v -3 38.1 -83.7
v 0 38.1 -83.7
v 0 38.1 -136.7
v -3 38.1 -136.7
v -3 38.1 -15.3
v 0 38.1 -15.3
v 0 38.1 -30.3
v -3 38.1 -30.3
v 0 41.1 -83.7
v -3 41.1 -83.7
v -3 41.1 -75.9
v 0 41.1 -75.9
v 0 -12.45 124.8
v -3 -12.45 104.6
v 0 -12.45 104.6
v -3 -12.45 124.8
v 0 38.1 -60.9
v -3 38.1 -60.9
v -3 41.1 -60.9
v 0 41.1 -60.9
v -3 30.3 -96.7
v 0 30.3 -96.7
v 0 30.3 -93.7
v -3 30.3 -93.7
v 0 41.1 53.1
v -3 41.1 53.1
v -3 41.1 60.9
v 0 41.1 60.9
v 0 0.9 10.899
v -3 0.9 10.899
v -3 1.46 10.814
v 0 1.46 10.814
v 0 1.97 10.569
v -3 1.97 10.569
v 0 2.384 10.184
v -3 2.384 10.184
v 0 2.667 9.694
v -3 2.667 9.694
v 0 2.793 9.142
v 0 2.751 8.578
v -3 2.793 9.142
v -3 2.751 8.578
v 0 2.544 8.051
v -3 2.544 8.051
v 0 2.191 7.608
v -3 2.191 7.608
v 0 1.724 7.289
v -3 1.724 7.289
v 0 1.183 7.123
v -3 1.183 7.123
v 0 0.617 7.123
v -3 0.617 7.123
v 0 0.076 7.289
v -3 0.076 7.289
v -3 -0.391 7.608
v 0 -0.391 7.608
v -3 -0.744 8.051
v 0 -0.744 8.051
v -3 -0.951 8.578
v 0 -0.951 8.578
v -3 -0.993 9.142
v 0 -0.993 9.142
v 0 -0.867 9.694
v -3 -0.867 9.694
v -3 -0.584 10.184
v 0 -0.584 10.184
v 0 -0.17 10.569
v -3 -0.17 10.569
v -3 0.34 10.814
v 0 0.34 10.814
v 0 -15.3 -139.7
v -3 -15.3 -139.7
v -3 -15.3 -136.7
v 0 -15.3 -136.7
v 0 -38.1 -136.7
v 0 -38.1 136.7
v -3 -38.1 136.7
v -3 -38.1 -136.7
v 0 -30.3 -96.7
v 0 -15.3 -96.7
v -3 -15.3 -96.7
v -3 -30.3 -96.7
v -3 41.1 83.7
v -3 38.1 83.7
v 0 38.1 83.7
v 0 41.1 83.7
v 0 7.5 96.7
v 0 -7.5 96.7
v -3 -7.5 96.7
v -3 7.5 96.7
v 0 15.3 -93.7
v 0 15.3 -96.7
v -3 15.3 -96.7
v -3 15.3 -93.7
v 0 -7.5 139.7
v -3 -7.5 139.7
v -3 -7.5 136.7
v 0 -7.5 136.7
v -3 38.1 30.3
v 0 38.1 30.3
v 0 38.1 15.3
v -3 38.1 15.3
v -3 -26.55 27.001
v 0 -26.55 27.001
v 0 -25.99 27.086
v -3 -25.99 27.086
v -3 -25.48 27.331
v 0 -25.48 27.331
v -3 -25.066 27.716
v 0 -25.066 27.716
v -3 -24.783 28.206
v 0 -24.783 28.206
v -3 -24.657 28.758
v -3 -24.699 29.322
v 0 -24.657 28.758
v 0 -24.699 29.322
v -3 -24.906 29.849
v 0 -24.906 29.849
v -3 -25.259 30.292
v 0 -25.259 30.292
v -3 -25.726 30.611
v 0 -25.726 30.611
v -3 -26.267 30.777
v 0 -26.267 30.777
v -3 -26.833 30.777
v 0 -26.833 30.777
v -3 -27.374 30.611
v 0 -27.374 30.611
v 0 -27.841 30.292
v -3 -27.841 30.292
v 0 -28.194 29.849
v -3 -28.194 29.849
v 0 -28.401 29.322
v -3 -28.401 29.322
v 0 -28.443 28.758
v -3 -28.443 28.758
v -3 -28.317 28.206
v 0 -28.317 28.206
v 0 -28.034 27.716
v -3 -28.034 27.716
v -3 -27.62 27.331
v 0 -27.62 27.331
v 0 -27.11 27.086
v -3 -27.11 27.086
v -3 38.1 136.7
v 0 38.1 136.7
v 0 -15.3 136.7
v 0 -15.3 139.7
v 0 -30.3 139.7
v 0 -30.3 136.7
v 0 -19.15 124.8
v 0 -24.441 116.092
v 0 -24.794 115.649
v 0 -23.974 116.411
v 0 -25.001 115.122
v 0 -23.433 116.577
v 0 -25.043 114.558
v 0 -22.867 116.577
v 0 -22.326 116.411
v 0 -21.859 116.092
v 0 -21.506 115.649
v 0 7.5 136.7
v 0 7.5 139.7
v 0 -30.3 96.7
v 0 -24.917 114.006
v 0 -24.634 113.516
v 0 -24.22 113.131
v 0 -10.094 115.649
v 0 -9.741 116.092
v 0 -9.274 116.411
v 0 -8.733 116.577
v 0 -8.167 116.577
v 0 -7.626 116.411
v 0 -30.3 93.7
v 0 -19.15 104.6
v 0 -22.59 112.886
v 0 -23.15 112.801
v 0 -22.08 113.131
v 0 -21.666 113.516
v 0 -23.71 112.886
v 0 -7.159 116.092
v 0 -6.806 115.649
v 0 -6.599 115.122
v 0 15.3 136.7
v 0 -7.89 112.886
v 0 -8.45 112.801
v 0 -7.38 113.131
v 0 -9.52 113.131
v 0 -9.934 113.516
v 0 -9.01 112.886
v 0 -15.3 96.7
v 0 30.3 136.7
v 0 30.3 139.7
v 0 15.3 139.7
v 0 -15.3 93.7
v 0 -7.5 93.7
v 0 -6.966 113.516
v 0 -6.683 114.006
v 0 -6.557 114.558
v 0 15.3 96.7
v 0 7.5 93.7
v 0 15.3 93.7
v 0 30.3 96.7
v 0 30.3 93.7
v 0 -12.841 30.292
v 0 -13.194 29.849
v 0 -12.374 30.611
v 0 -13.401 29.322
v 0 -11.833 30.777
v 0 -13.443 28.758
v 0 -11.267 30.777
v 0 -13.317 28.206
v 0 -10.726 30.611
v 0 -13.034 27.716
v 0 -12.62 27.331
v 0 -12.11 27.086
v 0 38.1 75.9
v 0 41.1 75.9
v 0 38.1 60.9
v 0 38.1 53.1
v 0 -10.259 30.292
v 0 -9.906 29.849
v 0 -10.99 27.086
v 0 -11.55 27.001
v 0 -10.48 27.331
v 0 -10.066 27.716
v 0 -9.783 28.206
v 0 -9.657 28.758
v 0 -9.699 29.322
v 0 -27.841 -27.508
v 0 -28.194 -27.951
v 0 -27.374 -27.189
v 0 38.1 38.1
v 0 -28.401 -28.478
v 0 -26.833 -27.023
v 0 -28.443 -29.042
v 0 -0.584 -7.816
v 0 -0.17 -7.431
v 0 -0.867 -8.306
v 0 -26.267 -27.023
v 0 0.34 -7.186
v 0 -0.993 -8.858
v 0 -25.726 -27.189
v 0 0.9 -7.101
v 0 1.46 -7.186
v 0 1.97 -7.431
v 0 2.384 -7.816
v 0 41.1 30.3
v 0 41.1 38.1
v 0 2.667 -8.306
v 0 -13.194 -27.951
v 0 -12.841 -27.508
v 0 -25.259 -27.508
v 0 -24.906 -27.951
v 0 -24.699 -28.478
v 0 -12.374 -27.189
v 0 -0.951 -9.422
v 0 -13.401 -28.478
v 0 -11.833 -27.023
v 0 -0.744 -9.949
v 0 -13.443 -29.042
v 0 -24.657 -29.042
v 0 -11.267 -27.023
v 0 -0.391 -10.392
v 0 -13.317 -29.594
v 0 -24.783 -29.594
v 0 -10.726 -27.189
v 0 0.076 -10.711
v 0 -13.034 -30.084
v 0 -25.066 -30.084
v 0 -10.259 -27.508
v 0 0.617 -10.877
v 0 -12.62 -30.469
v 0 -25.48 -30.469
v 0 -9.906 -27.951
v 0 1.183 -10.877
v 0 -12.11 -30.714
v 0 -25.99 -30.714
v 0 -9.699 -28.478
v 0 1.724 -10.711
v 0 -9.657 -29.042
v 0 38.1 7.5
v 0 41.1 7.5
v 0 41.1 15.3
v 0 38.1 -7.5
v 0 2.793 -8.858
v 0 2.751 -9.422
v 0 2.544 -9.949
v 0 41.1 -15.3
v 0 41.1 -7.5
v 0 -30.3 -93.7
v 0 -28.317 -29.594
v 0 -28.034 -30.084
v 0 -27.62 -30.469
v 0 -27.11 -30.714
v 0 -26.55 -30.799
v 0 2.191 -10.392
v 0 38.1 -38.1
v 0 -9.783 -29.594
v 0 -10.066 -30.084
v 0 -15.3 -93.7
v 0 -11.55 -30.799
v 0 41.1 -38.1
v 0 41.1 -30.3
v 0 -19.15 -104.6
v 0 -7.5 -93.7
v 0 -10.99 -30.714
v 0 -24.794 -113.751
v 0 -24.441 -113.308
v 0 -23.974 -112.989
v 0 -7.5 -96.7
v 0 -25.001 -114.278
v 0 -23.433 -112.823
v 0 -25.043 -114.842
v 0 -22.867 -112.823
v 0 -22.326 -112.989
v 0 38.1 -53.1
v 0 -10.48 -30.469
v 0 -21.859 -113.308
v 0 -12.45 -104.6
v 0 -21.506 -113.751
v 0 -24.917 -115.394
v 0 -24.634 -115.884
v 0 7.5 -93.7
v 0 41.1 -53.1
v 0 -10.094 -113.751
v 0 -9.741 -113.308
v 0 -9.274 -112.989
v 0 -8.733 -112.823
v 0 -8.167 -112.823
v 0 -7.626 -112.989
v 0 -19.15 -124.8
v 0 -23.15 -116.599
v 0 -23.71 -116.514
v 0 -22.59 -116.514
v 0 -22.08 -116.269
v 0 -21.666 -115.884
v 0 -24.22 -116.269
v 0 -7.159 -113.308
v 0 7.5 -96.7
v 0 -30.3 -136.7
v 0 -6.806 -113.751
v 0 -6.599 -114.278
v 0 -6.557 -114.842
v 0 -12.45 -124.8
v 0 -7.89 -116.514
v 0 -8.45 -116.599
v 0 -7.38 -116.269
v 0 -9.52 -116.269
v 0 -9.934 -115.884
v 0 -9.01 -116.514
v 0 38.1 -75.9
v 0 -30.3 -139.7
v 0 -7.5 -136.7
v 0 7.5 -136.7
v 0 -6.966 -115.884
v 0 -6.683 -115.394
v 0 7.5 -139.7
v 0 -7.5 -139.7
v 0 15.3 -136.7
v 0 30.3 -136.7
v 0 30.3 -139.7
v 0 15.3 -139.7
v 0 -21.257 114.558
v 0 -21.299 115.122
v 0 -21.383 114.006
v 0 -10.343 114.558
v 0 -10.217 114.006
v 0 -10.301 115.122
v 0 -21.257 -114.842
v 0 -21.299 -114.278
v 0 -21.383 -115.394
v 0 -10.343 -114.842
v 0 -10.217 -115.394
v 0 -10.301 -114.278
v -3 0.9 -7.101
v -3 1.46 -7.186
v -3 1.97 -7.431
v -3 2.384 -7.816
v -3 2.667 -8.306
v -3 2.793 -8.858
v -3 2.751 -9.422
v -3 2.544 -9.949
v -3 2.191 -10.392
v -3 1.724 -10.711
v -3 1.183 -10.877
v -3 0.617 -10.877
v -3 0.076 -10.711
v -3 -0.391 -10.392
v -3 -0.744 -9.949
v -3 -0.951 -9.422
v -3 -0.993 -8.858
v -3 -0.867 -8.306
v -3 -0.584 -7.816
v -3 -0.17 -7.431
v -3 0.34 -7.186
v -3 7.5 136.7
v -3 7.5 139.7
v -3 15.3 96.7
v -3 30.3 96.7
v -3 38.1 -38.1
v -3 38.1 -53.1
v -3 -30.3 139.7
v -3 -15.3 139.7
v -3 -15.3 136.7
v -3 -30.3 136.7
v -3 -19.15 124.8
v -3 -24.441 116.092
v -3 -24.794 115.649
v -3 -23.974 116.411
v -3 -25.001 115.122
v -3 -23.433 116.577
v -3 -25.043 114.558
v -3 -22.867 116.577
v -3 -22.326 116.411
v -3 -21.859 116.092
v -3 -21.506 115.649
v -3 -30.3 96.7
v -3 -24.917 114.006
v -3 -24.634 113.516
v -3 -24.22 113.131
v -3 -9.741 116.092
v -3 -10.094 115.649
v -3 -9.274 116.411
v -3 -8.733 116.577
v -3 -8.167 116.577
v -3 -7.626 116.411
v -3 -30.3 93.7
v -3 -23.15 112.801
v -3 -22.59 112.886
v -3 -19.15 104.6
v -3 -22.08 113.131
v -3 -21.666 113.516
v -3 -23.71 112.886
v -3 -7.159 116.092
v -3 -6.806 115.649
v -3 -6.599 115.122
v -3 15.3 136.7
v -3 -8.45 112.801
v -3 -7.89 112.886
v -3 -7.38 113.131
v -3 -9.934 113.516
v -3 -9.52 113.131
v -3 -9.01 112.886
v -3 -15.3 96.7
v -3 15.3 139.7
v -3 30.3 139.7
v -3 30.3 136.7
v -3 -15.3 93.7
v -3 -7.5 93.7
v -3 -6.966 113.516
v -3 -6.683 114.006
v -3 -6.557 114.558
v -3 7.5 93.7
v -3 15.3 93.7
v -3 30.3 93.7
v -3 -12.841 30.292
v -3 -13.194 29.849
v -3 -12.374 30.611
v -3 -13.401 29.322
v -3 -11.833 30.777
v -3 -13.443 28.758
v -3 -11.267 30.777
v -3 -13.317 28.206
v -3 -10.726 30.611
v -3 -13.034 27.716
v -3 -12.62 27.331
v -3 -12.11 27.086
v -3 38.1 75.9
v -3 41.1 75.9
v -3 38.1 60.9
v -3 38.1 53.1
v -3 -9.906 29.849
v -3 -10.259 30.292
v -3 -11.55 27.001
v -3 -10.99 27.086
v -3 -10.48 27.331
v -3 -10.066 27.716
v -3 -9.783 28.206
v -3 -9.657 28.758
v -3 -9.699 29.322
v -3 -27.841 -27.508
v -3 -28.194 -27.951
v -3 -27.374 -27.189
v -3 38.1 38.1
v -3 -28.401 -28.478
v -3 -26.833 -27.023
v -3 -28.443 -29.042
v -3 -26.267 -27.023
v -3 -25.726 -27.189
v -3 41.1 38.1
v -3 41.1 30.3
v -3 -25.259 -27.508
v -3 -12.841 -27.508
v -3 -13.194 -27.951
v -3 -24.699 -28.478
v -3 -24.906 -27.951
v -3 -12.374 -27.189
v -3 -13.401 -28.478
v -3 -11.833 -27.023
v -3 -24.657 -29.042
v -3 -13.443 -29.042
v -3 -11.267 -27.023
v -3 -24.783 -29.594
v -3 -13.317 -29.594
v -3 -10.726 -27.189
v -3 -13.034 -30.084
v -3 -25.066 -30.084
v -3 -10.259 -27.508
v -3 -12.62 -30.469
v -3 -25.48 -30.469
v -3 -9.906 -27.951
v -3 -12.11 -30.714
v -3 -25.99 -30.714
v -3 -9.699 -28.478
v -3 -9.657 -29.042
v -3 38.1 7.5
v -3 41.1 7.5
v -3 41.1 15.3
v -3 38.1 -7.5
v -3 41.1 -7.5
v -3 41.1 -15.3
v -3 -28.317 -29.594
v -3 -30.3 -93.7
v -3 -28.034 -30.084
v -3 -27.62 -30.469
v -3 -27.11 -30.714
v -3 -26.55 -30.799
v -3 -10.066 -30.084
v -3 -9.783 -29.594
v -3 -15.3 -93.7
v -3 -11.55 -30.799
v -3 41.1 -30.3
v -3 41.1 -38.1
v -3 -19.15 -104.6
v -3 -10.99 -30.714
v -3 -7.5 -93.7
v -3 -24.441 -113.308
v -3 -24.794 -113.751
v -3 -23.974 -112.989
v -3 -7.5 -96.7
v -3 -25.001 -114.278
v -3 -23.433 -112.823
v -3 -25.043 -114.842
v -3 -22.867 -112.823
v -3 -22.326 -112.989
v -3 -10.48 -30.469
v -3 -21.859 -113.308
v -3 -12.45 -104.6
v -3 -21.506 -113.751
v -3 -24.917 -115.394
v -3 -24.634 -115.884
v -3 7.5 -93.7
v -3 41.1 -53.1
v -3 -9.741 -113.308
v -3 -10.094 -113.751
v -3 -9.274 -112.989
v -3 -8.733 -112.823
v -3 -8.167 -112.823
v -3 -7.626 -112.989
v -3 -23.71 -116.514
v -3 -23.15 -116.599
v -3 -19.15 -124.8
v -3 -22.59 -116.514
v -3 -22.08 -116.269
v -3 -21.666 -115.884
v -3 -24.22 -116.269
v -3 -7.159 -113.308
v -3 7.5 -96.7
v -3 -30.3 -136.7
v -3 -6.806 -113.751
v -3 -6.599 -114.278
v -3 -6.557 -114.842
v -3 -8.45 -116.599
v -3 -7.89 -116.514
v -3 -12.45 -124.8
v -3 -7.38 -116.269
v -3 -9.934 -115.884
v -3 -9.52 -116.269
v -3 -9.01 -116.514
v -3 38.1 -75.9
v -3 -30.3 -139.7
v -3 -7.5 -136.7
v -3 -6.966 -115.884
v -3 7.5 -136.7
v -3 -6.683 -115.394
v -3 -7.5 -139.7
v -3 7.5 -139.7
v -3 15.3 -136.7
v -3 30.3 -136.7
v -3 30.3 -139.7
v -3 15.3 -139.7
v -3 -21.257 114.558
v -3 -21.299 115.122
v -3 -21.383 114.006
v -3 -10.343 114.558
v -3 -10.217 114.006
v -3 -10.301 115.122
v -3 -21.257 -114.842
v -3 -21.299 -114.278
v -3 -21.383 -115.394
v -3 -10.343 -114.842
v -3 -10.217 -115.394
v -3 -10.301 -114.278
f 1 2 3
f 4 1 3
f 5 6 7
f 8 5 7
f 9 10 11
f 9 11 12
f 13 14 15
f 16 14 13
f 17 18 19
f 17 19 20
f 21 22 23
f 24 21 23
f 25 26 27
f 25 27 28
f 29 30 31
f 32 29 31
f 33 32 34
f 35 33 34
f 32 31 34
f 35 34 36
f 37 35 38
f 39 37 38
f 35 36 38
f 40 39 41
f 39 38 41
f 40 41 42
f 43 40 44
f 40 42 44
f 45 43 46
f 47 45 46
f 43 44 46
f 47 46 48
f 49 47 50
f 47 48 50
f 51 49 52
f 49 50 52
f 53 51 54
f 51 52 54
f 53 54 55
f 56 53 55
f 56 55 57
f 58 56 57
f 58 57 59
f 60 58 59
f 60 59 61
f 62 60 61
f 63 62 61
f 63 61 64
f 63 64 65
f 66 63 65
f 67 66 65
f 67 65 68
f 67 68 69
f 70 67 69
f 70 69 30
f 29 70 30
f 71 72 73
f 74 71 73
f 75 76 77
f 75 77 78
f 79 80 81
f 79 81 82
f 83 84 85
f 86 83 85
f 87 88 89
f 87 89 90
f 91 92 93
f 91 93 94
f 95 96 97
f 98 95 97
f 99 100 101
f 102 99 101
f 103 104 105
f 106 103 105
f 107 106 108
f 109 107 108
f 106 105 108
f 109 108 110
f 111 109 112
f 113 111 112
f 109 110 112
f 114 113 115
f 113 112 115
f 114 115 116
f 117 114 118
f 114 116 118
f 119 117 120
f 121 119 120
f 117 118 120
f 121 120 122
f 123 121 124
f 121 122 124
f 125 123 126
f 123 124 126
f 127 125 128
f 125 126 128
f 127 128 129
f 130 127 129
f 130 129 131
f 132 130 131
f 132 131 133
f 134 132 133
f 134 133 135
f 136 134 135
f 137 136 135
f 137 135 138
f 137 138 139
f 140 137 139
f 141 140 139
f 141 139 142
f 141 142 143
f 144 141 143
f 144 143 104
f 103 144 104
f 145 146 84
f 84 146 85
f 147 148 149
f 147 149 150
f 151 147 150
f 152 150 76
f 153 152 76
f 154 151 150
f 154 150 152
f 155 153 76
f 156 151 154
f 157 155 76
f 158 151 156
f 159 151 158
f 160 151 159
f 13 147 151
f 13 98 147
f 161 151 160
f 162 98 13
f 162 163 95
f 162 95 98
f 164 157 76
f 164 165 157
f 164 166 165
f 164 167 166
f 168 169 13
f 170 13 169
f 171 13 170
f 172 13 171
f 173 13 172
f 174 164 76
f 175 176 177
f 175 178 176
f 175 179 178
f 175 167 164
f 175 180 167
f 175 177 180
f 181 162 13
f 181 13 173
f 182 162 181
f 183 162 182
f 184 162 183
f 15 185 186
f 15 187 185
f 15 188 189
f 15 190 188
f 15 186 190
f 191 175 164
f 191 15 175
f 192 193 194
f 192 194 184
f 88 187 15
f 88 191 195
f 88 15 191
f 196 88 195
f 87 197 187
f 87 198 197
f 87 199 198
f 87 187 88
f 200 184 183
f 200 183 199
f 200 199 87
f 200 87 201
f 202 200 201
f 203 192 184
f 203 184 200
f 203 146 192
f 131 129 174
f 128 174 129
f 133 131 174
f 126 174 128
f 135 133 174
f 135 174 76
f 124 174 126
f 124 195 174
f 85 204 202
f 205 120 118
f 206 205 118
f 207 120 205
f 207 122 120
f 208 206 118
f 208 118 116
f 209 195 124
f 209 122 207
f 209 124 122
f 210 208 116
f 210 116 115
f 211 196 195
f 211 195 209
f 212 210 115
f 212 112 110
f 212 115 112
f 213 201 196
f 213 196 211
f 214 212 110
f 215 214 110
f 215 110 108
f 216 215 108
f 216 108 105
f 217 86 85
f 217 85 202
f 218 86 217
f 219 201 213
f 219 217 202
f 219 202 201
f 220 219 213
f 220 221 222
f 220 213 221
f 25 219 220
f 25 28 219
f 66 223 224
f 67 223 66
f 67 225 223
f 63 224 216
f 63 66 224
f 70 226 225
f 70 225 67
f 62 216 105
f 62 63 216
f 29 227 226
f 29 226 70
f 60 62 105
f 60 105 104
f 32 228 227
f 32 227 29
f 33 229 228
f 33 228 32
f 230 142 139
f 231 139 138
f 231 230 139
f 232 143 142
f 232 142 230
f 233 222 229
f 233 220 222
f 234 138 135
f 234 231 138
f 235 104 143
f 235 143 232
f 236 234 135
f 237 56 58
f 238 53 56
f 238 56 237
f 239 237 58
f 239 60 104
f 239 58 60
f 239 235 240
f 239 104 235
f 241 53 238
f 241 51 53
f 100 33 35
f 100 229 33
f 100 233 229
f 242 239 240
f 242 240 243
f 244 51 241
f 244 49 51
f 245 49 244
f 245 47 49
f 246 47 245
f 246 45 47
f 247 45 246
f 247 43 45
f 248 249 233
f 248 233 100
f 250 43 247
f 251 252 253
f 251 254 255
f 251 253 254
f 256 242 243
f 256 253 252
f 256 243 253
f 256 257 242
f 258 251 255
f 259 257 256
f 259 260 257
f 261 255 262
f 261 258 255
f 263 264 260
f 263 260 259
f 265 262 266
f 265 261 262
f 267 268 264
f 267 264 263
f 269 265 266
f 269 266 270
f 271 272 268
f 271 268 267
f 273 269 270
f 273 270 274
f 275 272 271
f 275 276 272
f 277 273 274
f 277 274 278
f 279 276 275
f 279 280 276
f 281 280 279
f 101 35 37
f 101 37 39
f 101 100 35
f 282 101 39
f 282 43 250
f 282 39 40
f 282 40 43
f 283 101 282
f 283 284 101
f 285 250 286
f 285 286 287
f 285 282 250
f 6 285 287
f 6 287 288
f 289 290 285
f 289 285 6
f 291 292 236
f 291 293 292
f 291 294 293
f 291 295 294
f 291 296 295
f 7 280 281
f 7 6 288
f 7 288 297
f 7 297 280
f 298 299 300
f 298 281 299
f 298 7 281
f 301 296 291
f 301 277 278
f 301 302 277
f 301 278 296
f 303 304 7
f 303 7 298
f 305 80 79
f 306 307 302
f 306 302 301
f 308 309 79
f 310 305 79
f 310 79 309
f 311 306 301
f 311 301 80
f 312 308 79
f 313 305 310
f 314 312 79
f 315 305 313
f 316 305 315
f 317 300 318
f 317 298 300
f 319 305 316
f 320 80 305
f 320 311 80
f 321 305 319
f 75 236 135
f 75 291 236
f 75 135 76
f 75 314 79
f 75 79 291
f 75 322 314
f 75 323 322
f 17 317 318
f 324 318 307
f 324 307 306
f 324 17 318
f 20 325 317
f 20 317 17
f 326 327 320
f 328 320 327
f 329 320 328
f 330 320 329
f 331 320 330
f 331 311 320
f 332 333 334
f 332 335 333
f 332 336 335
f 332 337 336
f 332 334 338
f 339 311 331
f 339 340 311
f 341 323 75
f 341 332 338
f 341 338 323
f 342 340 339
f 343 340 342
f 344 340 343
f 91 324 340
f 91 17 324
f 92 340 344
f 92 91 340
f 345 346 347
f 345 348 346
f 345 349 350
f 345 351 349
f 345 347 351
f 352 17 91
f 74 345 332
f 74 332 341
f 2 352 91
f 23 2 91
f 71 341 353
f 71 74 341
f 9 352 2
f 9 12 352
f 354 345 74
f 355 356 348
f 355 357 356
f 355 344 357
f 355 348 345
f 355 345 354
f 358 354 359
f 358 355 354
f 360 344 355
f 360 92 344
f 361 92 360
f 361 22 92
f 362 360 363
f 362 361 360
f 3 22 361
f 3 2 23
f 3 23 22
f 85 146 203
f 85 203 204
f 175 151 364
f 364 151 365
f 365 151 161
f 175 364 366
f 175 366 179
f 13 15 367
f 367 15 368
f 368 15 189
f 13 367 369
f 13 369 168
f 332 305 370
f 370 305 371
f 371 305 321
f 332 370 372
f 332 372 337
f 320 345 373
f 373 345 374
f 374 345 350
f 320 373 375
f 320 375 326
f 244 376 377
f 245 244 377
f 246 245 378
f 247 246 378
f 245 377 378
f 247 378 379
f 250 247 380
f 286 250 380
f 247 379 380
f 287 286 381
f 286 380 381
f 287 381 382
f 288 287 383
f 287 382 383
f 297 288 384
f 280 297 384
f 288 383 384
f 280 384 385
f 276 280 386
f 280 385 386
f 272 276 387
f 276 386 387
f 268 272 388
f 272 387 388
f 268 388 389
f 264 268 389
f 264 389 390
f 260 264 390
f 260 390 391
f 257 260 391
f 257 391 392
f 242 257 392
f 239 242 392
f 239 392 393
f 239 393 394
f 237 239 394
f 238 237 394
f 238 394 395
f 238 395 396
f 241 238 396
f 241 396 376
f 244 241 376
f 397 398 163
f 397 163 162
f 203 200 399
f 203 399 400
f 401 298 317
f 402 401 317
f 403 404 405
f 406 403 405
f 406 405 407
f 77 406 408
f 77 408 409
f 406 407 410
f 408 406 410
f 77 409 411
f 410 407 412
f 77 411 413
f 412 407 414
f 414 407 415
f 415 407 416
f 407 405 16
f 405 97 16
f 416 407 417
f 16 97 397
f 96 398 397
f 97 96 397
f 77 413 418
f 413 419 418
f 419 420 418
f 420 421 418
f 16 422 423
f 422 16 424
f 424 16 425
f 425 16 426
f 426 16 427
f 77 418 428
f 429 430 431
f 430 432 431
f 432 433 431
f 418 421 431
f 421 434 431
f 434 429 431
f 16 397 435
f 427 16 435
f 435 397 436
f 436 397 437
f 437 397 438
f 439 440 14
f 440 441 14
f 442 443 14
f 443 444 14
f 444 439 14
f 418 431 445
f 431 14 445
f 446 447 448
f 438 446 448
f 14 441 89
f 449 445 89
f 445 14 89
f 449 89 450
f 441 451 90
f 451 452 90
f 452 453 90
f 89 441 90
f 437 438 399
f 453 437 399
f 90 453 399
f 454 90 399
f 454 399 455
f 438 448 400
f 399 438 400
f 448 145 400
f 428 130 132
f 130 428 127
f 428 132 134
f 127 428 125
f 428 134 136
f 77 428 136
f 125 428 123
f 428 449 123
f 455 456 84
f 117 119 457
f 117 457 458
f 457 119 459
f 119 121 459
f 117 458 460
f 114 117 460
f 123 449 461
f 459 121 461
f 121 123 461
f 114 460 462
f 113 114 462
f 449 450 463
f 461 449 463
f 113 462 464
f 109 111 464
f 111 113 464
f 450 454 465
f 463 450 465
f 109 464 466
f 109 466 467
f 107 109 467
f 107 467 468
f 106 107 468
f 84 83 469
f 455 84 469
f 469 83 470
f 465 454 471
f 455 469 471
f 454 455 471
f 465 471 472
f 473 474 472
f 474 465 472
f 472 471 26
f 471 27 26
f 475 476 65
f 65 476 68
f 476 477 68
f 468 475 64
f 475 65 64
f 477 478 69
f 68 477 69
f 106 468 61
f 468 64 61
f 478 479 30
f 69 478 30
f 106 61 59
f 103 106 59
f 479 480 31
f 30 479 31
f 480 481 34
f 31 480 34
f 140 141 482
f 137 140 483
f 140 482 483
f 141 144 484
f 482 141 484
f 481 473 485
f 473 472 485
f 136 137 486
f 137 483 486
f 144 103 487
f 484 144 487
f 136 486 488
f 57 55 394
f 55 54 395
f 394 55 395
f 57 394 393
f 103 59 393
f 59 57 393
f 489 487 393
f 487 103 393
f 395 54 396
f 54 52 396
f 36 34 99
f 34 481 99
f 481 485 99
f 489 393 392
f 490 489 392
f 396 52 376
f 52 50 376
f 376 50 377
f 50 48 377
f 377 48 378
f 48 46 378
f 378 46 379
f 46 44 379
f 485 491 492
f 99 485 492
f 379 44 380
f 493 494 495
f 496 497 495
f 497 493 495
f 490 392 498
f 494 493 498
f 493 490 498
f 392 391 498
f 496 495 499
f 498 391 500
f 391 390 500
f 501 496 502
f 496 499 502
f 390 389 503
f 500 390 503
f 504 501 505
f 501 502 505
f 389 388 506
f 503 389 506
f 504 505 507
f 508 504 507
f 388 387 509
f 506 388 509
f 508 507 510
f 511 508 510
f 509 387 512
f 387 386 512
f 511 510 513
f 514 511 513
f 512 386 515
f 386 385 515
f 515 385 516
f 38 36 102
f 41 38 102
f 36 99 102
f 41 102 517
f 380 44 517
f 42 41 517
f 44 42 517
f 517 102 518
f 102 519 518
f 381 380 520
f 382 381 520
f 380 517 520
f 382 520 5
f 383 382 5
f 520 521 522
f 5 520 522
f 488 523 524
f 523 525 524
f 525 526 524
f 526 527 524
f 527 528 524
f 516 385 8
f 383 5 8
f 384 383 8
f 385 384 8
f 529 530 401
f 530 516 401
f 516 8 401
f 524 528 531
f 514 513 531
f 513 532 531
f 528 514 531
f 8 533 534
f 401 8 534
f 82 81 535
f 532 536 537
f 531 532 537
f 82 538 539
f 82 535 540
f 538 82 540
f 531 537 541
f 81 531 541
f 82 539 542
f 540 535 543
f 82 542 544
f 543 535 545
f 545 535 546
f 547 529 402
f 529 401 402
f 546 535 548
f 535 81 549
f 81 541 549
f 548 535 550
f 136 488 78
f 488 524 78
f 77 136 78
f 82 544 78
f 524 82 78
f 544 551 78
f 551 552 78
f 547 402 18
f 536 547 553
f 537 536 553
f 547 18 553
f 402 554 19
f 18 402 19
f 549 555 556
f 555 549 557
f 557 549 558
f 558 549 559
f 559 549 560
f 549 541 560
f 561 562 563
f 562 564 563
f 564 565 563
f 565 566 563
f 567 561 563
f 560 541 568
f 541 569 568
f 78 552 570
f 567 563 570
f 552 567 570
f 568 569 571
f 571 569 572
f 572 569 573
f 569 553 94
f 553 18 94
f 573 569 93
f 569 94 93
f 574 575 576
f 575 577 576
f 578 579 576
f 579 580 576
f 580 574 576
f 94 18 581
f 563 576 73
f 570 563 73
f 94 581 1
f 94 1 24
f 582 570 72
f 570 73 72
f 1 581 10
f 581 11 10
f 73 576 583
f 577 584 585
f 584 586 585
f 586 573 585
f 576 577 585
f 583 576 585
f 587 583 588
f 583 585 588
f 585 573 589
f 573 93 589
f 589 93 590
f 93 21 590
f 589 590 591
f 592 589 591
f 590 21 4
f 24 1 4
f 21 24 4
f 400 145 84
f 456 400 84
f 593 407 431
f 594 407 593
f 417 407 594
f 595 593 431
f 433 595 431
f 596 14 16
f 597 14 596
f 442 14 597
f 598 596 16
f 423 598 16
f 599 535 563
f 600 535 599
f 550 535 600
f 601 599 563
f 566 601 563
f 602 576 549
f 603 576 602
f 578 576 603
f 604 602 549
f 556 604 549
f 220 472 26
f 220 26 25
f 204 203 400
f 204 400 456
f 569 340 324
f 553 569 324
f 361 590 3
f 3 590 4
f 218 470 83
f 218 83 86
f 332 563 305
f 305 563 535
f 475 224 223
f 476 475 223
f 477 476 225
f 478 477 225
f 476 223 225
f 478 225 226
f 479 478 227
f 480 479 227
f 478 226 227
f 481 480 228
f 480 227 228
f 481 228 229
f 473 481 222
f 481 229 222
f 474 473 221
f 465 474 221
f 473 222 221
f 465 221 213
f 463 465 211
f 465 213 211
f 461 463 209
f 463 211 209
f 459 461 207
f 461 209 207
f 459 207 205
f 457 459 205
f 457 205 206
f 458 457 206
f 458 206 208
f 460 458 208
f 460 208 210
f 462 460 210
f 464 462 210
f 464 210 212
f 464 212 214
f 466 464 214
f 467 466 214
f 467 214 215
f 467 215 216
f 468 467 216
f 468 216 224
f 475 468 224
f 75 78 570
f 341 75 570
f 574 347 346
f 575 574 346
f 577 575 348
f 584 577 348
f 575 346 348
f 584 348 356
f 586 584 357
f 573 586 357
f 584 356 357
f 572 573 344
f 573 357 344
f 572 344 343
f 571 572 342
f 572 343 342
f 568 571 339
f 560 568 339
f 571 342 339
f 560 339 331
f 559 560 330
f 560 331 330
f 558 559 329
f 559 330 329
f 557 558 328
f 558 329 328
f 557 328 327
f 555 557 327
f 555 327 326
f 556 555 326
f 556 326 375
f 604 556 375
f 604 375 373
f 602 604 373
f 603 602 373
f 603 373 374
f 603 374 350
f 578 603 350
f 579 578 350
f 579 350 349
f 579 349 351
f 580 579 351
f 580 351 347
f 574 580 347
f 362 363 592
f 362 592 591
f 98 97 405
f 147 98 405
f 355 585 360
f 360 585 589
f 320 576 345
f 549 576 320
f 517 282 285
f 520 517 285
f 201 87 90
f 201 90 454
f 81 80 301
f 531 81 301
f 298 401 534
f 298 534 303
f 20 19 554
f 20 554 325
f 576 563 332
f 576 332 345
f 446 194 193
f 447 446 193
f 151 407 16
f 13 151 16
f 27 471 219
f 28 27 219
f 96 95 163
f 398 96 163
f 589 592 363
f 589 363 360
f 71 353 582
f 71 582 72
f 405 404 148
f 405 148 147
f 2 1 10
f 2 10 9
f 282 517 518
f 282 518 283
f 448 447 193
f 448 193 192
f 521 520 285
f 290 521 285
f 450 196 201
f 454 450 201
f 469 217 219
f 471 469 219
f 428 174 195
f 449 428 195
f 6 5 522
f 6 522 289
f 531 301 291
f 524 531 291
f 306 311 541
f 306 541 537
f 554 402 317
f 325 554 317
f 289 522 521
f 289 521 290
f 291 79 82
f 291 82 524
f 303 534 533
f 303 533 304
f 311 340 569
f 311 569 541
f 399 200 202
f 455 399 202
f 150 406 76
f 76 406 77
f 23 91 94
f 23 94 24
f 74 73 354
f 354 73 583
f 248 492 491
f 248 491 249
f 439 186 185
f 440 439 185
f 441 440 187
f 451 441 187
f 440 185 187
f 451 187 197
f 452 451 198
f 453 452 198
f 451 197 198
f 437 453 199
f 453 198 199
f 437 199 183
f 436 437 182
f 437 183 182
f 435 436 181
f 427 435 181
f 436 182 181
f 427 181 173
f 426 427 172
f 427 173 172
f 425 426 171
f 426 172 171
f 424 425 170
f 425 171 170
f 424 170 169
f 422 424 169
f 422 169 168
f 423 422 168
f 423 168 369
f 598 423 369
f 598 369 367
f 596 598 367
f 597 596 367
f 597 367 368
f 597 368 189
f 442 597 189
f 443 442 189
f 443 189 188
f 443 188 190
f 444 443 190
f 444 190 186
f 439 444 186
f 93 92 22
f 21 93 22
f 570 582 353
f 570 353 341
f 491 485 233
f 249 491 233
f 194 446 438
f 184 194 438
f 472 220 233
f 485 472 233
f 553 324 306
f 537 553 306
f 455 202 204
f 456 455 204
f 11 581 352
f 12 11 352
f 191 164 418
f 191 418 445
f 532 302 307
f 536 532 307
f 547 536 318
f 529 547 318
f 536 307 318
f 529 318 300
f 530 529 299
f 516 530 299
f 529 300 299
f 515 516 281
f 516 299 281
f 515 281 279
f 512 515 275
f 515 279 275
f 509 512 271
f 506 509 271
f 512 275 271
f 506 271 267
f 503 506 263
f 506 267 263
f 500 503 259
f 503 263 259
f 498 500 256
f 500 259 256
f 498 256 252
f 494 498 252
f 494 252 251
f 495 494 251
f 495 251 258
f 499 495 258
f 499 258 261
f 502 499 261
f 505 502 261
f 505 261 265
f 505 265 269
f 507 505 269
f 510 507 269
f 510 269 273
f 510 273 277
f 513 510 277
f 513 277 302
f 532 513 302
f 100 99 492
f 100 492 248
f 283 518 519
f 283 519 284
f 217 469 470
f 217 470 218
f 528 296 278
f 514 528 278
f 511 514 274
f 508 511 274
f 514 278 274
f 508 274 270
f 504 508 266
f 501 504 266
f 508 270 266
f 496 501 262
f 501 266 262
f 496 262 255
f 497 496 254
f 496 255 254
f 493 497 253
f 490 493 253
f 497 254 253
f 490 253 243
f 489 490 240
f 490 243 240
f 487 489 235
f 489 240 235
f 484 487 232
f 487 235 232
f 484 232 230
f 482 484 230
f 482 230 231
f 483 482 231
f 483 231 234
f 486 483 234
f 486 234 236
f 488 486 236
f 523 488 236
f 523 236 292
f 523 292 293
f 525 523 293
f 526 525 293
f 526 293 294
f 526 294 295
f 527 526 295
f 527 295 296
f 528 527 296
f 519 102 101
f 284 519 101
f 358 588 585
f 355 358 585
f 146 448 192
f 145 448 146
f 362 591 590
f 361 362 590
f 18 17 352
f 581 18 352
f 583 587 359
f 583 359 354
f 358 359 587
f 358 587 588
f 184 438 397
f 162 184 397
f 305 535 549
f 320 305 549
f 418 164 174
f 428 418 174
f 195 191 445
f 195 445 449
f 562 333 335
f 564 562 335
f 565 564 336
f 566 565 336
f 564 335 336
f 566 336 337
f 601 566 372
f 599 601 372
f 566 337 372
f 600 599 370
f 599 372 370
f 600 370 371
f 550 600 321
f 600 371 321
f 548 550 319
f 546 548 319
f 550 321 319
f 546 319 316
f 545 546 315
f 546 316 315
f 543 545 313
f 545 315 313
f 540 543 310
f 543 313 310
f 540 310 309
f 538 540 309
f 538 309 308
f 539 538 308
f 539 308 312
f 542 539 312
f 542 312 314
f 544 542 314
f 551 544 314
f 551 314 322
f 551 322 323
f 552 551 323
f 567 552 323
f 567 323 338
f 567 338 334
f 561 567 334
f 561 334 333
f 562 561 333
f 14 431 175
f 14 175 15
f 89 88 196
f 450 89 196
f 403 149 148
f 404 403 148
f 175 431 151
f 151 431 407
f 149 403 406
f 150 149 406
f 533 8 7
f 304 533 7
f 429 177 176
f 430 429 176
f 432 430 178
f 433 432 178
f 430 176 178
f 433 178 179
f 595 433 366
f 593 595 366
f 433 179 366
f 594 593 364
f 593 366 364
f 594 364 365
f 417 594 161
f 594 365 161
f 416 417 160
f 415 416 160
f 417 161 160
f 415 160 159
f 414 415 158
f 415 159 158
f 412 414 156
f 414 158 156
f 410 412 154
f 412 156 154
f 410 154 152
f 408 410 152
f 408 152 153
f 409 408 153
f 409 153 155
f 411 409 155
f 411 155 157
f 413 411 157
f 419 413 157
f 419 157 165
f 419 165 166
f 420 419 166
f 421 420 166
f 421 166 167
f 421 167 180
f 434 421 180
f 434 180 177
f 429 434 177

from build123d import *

# Parameters (mm, degrees)
SKETCH1_W               = 279.4
SKETCH1_H               = 76.2
BOSS_EXTRUDE1_DEPTH     = 3
SKETCH3_W               = 3
SKETCH3_H               = 7.8
CUT_EXTRUDE1_DEPTH      = 145.833352512
LPATTERN1_COUNT         = 4
LPATTERN1_PITCH         = 22.8
MIRROR1_COPY_1_SKETCH_W = 3
MIRROR1_COPY_1_SKETCH_H = 7.8
MIRROR1_COPY_1_DEPTH    = 145.833352512
MIRROR1_COPY_2_SKETCH_W = 3
MIRROR1_COPY_2_SKETCH_H = 7.8
MIRROR1_COPY_2_DEPTH    = 145.833352512
MIRROR1_COPY_3_SKETCH_W = 3
MIRROR1_COPY_3_SKETCH_H = 7.8
MIRROR1_COPY_3_DEPTH    = 145.833352512
SKETCH4_W               = 3
SKETCH4_H               = 15
CUT_EXTRUDE2_DEPTH      = 10
LPATTERN2_COUNT         = 3
LPATTERN2_PITCH         = 22.8
MIRROR2_COPY_1_SKETCH_W = 3
MIRROR2_COPY_1_SKETCH_H = 15
MIRROR2_COPY_1_DEPTH    = 10
MIRROR2_COPY_2_SKETCH_W = 3
MIRROR2_COPY_2_SKETCH_H = 15
MIRROR2_COPY_2_DEPTH    = 10
SKETCH5_W               = 3
SKETCH5_H               = 7.8
BOSS_EXTRUDE2_DEPTH     = 3
LPATTERN3_COUNT         = 8
LPATTERN3_PITCH         = 22.8
F_6_CLEARANCE_HOLE1_D   = 3.7973
F_6_CLEARANCE_HOLE2_D   = 3.7973
CUT_EXTRUDE3_REACH      = 147.651
SKETCH10_W              = 20.2
SKETCH10_H              = 6.7
F_6_CLEARANCE_HOLE3_D   = 3.7973


with BuildPart() as part:
    # Sketch1 → Boss-Extrude1 (new body)
    with BuildSketch(Plane(origin=(0, 0, 0), x_dir=(0, 0, -1), z_dir=(1, 0, 0))):
        Rectangle(SKETCH1_W, SKETCH1_H)
    extrude(amount=-BOSS_EXTRUDE1_DEPTH)

    # Sketch3 → Cut-Extrude1 (cut, through all)
    with BuildSketch(Plane.ZY.offset(3)):
        with Locations((-138.2, 34.2)):
            Rectangle(SKETCH3_W, SKETCH3_H)
    cut_extrude1 = extrude(amount=-CUT_EXTRUDE1_DEPTH, mode=Mode.SUBTRACT)

    # LPattern1: Cut-Extrude1 ×4
    with Locations(*[(0, -i * LPATTERN1_PITCH, 0) for i in range(1, LPATTERN1_COUNT)]):
        add(cut_extrude1, mode=Mode.SUBTRACT)

    # Mirror1: Cut-Extrude1 across plane
    add(cut_extrude1.mirror(Plane.XY), mode=Mode.SUBTRACT)

    # Mirror1 copy 1 sketch → Mirror1 copy 1 (cut, through all)
    with BuildSketch(Plane(origin=(-3, -22.8, 0), x_dir=(0, 0, -1), z_dir=(-1, 0, 0))):
        with Locations((-138.2, -34.2)):
            Rectangle(MIRROR1_COPY_1_SKETCH_W, MIRROR1_COPY_1_SKETCH_H)
    extrude(amount=-MIRROR1_COPY_1_DEPTH, mode=Mode.SUBTRACT)

    # Mirror1 copy 2 sketch → Mirror1 copy 2 (cut, through all)
    with BuildSketch(Plane(origin=(-3, -45.6, 0), x_dir=(0, 0, -1), z_dir=(-1, 0, 0))):
        with Locations((-138.2, -34.2)):
            Rectangle(MIRROR1_COPY_2_SKETCH_W, MIRROR1_COPY_2_SKETCH_H)
    extrude(amount=-MIRROR1_COPY_2_DEPTH, mode=Mode.SUBTRACT)

    # Mirror1 copy 3 sketch → Mirror1 copy 3 (cut, through all)
    with BuildSketch(Plane(origin=(-3, -68.4, 0), x_dir=(0, 0, -1), z_dir=(-1, 0, 0))):
        with Locations((-138.2, -34.2)):
            Rectangle(MIRROR1_COPY_3_SKETCH_W, MIRROR1_COPY_3_SKETCH_H)
    extrude(amount=-MIRROR1_COPY_3_DEPTH, mode=Mode.SUBTRACT)

    # Sketch4 → Cut-Extrude2 (cut)
    with BuildSketch(Plane(origin=(0, 0, 0), x_dir=(0, 0, -1), z_dir=(1, 0, 0))):
        with Locations((-95.2, 22.8)):
            Rectangle(SKETCH4_W, SKETCH4_H)
    cut_extrude2 = extrude(amount=-CUT_EXTRUDE2_DEPTH, mode=Mode.SUBTRACT)

    # LPattern2: Cut-Extrude2 ×3
    with Locations(*[(0, -i * LPATTERN2_PITCH, 0) for i in range(1, LPATTERN2_COUNT)]):
        add(cut_extrude2, mode=Mode.SUBTRACT)

    # Mirror2: Cut-Extrude2 across plane
    add(cut_extrude2.mirror(Plane.XY), mode=Mode.SUBTRACT)

    # Mirror2 copy 1 sketch → Mirror2 copy 1 (cut)
    with BuildSketch(Plane(origin=(0, -22.8, 0), x_dir=(0, 0, 1), z_dir=(1, 0, 0))):
        with Locations((-95.2, -22.8)):
            Rectangle(MIRROR2_COPY_1_SKETCH_W, MIRROR2_COPY_1_SKETCH_H)
    extrude(amount=-MIRROR2_COPY_1_DEPTH, mode=Mode.SUBTRACT)

    # Mirror2 copy 2 sketch → Mirror2 copy 2 (cut)
    with BuildSketch(Plane(origin=(0, -45.6, 0), x_dir=(0, 0, 1), z_dir=(1, 0, 0))):
        with Locations((-95.2, -22.8)):
            Rectangle(MIRROR2_COPY_2_SKETCH_W, MIRROR2_COPY_2_SKETCH_H)
    extrude(amount=-MIRROR2_COPY_2_DEPTH, mode=Mode.SUBTRACT)

    # Sketch5 → Boss-Extrude2 (add)
    with BuildSketch(Plane(origin=(0, 38.1, 0), x_dir=(1, 0, 0), z_dir=(0, 1, 0))):
        with Locations((-1.5, -79.8)):
            Rectangle(SKETCH5_W, SKETCH5_H)
    boss_extrude2 = extrude(amount=BOSS_EXTRUDE2_DEPTH)

    # LPattern3: Boss-Extrude2 ×8
    with Locations(*[(0, 0, -i * LPATTERN3_PITCH) for i in range(1, LPATTERN3_COUNT)]):
        add(boss_extrude2)

    # #6 Clearance Hole1 (through all)
    with Locations(Plane.ZY.offset(3)):
        with Locations((-28.9, -11.55), (-28.9, -26.55), (28.9, -26.55), (28.9, -11.55)):
            Hole(F_6_CLEARANCE_HOLE1_D / 2)

    # #6 Clearance Hole2 (through all)
    with Locations(Plane(origin=(0, 0, 0), x_dir=(0, 0, -1), z_dir=(1, 0, 0))):
        with Locations((-9, 0.9), (9, 0.9)):
            Hole(F_6_CLEARANCE_HOLE2_D / 2)

    # Sketch10 → Cut-Extrude3 (cut, up to next)
    with BuildSketch(Plane.ZY.offset(3), mode=Mode.PRIVATE) as cut_extrude3_sk1:
        with Locations((114.7, -15.8)):
            Rectangle(SKETCH10_W, SKETCH10_H)
    cut_extrude3_tool1 = extrude(cut_extrude3_sk1.sketch, amount=-CUT_EXTRUDE3_REACH, mode=Mode.PRIVATE) & part.part
    # Sketch10 → Cut-Extrude3 (cut, up to next)
    with BuildSketch(Plane.ZY.offset(3), mode=Mode.PRIVATE) as cut_extrude3_sk2:
        with Locations((-114.7, -15.8)):
            Rectangle(SKETCH10_W, SKETCH10_H)
    cut_extrude3_tool2 = extrude(cut_extrude3_sk2.sketch, amount=-CUT_EXTRUDE3_REACH, mode=Mode.PRIVATE) & part.part
    add(cut_extrude3_tool1.solids().sort_by_distance((-3, -15.8, 114.7))[0], mode=Mode.SUBTRACT)
    add(cut_extrude3_tool2.solids().sort_by_distance((-3, -15.8, -114.7))[0], mode=Mode.SUBTRACT)

    # #6 Clearance Hole3 (through all)
    with Locations(Plane.ZY.offset(3)):
        with Locations((-114.7, -8.45), (-114.7, -23.15), (114.7, -23.15), (114.7, -8.45)):
            Hole(F_6_CLEARANCE_HOLE3_D / 2)


solid = part.part
